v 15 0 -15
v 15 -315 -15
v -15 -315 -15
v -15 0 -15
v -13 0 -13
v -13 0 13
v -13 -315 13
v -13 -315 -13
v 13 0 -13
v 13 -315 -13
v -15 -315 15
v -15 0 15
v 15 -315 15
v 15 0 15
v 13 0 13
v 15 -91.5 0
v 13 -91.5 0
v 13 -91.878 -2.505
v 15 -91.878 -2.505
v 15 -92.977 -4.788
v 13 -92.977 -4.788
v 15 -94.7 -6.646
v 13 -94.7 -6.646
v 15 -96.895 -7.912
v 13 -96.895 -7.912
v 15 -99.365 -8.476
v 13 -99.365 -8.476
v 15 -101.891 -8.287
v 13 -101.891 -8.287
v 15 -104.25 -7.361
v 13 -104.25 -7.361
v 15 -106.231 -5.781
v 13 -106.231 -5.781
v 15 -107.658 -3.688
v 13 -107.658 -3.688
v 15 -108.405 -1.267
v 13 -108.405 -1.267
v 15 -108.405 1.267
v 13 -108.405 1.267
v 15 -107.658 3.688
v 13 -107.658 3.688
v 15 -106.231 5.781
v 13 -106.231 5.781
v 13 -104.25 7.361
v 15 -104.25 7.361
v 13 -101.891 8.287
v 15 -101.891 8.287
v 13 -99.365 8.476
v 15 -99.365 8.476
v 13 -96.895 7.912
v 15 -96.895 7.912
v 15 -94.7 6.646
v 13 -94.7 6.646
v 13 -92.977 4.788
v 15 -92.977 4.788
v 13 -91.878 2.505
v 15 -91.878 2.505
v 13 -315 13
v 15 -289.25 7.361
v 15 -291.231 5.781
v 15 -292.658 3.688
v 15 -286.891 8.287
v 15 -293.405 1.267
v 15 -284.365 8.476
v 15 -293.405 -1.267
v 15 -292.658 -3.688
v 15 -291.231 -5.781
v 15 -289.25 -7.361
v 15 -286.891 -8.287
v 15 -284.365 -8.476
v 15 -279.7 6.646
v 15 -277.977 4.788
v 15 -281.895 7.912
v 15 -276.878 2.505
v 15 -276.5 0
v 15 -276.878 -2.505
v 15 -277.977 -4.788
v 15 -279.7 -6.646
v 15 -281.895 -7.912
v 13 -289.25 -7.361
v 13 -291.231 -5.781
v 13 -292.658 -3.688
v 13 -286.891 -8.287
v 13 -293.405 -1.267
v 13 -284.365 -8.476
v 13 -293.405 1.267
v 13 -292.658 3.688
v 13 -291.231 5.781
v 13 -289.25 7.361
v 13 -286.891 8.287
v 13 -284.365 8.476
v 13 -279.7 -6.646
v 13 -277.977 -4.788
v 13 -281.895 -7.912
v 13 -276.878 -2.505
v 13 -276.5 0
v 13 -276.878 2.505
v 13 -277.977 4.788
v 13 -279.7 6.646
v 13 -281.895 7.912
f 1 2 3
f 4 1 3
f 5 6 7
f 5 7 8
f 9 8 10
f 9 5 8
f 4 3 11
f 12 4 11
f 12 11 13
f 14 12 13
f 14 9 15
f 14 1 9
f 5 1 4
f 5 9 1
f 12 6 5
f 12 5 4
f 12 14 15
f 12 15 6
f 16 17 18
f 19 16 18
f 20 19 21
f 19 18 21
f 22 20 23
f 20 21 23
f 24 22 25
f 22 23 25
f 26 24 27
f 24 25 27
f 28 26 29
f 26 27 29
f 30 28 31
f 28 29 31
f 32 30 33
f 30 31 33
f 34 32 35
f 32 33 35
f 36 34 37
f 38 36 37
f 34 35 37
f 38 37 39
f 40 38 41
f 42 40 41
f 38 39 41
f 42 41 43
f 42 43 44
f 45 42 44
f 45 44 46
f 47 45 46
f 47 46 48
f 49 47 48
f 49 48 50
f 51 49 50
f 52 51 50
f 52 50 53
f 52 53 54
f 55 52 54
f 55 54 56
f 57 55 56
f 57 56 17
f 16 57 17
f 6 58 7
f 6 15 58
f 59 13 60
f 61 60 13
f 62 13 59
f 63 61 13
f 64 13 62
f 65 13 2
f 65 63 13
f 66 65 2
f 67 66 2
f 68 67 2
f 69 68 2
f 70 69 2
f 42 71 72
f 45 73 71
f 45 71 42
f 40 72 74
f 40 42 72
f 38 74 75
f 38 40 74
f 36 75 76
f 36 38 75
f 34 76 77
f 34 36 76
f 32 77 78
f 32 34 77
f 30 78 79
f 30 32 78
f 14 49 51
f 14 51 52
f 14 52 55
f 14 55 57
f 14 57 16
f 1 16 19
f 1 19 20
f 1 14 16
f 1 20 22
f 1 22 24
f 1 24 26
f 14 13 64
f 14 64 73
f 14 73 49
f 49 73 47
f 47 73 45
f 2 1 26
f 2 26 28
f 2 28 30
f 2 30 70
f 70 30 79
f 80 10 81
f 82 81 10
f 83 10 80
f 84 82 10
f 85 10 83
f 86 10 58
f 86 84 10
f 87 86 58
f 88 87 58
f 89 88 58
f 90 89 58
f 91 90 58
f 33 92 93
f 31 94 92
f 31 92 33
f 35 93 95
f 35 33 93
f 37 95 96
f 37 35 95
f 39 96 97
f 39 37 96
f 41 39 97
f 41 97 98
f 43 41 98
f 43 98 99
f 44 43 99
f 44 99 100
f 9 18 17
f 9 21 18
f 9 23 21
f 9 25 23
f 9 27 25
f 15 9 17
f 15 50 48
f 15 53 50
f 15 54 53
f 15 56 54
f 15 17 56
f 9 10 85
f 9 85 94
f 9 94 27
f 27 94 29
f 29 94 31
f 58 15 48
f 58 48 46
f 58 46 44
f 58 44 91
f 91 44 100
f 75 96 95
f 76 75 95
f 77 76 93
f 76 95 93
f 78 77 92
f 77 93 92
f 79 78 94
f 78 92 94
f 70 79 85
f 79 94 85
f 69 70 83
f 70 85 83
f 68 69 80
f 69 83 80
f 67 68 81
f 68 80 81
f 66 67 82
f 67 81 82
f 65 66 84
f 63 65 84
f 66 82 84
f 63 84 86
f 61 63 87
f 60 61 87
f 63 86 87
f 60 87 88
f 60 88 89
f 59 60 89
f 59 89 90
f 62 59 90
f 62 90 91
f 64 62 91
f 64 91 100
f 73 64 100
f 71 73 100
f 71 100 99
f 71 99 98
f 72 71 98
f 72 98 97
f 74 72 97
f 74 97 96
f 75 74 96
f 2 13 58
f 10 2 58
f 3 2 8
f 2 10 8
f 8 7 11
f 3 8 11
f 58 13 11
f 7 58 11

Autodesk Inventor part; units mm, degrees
ref_plane "YZ Plane" through (0, 0, 0) normal (1, 0, 0) x (0, 1, 0)
ref_plane "XZ Plane" through (0, 0, 0) normal (0, 1, 0) x (-1, 0, 0)
ref_plane "XY Plane" through (0, 0, 0) normal (0, 0, 1) x (1, 0, 0)
sketch "Sketch9" plane through (0, 0, 0) normal (0, 1, 0) x (-1, 0, 0)
  line L0 (15, 15) -> (-15, 15)
  line L1 (-15, 15) -> (-15, -15)
  line L2 (-15, -15) -> (15, -15)
  line L3 (15, -15) -> (15, 15)
  line L4 (15, 15) -> (-15, -15) construction
  line L5 (-15, 15) -> (15, -15) construction
  line L6 (-13, 13) -> (13, 13)
  line L7 (13, 13) -> (13, -13)
  line L8 (13, -13) -> (-13, -13)
  line L9 (-13, -13) -> (-13, 13)
  point P0 (0, 0)
  dimension "d172" = 30
  dimension "d173" = 30
  dimension "d174" = 2
extrude "Extrusion3" add sketch "Sketch9" against normal blind 315
sketch "Sketch10" plane through (0, 0, 0) normal (1, 0, 0) x (0, 1, 0)
  line L0 (0, 15) -> (0, -15) construction
  line L1 (0, 15) -> (-315, 15) construction
  line L2 (-315, -15) -> (-315, 15) construction
  line L3 (0, -15) -> (-315, -15) construction
  line L4 (-108.5, 8.5) -> (-91.5, 8.5)
  line L5 (-91.5, 8.5) -> (-91.5, -8.5)
  line L6 (-91.5, -8.5) -> (-108.5, -8.5)
  line L7 (-108.5, -8.5) -> (-108.5, 8.5)
  line L8 (-108.5, 8.5) -> (-91.5, -8.5) construction
  line L9 (-91.5, 8.5) -> (-108.5, -8.5) construction
  line L10 (-293.5, 8.5) -> (-276.5, 8.5)
  line L11 (-276.5, 8.5) -> (-276.5, -8.5)
  line L12 (-276.5, -8.5) -> (-293.5, -8.5)
  line L13 (-293.5, -8.5) -> (-293.5, 8.5)
  line L14 (-293.5, 8.5) -> (-276.5, -8.5) construction
  line L15 (-276.5, 8.5) -> (-293.5, -8.5) construction
  line L16 (-413.5, 8.5) -> (-396.5, 8.5)
  line L17 (-396.5, 8.5) -> (-396.5, -8.5)
  line L18 (-396.5, -8.5) -> (-413.5, -8.5)
  line L19 (-413.5, -8.5) -> (-413.5, 8.5)
  line L20 (-413.5, 8.5) -> (-396.5, -8.5) construction
  line L21 (-396.5, 8.5) -> (-413.5, -8.5) construction
  circle A0 centre (-470, 0) radius 8.5
  line L22 (0, 0) -> (30, 0)
  circle A1 centre (-100, 0) radius 8.5
  circle A2 centre (-285, 0) radius 8.5
  circle A3 centre (-405, 0) radius 8.5
  dimension "d177" = 17
  dimension "d178" = 17
  dimension "d181" = 30
  dimension "d182" = 130
  dimension "d183" = 315
  dimension "d184" = 435
  dimension "d185" = 500
  dimension "d186" = 17
extrude "Extrusion4" cut sketch "Sketch10" along normal through all contours A1 | A2
properties part number "SLM 1662 FDS 1000 way tube 2" material "Stainless Steel"
